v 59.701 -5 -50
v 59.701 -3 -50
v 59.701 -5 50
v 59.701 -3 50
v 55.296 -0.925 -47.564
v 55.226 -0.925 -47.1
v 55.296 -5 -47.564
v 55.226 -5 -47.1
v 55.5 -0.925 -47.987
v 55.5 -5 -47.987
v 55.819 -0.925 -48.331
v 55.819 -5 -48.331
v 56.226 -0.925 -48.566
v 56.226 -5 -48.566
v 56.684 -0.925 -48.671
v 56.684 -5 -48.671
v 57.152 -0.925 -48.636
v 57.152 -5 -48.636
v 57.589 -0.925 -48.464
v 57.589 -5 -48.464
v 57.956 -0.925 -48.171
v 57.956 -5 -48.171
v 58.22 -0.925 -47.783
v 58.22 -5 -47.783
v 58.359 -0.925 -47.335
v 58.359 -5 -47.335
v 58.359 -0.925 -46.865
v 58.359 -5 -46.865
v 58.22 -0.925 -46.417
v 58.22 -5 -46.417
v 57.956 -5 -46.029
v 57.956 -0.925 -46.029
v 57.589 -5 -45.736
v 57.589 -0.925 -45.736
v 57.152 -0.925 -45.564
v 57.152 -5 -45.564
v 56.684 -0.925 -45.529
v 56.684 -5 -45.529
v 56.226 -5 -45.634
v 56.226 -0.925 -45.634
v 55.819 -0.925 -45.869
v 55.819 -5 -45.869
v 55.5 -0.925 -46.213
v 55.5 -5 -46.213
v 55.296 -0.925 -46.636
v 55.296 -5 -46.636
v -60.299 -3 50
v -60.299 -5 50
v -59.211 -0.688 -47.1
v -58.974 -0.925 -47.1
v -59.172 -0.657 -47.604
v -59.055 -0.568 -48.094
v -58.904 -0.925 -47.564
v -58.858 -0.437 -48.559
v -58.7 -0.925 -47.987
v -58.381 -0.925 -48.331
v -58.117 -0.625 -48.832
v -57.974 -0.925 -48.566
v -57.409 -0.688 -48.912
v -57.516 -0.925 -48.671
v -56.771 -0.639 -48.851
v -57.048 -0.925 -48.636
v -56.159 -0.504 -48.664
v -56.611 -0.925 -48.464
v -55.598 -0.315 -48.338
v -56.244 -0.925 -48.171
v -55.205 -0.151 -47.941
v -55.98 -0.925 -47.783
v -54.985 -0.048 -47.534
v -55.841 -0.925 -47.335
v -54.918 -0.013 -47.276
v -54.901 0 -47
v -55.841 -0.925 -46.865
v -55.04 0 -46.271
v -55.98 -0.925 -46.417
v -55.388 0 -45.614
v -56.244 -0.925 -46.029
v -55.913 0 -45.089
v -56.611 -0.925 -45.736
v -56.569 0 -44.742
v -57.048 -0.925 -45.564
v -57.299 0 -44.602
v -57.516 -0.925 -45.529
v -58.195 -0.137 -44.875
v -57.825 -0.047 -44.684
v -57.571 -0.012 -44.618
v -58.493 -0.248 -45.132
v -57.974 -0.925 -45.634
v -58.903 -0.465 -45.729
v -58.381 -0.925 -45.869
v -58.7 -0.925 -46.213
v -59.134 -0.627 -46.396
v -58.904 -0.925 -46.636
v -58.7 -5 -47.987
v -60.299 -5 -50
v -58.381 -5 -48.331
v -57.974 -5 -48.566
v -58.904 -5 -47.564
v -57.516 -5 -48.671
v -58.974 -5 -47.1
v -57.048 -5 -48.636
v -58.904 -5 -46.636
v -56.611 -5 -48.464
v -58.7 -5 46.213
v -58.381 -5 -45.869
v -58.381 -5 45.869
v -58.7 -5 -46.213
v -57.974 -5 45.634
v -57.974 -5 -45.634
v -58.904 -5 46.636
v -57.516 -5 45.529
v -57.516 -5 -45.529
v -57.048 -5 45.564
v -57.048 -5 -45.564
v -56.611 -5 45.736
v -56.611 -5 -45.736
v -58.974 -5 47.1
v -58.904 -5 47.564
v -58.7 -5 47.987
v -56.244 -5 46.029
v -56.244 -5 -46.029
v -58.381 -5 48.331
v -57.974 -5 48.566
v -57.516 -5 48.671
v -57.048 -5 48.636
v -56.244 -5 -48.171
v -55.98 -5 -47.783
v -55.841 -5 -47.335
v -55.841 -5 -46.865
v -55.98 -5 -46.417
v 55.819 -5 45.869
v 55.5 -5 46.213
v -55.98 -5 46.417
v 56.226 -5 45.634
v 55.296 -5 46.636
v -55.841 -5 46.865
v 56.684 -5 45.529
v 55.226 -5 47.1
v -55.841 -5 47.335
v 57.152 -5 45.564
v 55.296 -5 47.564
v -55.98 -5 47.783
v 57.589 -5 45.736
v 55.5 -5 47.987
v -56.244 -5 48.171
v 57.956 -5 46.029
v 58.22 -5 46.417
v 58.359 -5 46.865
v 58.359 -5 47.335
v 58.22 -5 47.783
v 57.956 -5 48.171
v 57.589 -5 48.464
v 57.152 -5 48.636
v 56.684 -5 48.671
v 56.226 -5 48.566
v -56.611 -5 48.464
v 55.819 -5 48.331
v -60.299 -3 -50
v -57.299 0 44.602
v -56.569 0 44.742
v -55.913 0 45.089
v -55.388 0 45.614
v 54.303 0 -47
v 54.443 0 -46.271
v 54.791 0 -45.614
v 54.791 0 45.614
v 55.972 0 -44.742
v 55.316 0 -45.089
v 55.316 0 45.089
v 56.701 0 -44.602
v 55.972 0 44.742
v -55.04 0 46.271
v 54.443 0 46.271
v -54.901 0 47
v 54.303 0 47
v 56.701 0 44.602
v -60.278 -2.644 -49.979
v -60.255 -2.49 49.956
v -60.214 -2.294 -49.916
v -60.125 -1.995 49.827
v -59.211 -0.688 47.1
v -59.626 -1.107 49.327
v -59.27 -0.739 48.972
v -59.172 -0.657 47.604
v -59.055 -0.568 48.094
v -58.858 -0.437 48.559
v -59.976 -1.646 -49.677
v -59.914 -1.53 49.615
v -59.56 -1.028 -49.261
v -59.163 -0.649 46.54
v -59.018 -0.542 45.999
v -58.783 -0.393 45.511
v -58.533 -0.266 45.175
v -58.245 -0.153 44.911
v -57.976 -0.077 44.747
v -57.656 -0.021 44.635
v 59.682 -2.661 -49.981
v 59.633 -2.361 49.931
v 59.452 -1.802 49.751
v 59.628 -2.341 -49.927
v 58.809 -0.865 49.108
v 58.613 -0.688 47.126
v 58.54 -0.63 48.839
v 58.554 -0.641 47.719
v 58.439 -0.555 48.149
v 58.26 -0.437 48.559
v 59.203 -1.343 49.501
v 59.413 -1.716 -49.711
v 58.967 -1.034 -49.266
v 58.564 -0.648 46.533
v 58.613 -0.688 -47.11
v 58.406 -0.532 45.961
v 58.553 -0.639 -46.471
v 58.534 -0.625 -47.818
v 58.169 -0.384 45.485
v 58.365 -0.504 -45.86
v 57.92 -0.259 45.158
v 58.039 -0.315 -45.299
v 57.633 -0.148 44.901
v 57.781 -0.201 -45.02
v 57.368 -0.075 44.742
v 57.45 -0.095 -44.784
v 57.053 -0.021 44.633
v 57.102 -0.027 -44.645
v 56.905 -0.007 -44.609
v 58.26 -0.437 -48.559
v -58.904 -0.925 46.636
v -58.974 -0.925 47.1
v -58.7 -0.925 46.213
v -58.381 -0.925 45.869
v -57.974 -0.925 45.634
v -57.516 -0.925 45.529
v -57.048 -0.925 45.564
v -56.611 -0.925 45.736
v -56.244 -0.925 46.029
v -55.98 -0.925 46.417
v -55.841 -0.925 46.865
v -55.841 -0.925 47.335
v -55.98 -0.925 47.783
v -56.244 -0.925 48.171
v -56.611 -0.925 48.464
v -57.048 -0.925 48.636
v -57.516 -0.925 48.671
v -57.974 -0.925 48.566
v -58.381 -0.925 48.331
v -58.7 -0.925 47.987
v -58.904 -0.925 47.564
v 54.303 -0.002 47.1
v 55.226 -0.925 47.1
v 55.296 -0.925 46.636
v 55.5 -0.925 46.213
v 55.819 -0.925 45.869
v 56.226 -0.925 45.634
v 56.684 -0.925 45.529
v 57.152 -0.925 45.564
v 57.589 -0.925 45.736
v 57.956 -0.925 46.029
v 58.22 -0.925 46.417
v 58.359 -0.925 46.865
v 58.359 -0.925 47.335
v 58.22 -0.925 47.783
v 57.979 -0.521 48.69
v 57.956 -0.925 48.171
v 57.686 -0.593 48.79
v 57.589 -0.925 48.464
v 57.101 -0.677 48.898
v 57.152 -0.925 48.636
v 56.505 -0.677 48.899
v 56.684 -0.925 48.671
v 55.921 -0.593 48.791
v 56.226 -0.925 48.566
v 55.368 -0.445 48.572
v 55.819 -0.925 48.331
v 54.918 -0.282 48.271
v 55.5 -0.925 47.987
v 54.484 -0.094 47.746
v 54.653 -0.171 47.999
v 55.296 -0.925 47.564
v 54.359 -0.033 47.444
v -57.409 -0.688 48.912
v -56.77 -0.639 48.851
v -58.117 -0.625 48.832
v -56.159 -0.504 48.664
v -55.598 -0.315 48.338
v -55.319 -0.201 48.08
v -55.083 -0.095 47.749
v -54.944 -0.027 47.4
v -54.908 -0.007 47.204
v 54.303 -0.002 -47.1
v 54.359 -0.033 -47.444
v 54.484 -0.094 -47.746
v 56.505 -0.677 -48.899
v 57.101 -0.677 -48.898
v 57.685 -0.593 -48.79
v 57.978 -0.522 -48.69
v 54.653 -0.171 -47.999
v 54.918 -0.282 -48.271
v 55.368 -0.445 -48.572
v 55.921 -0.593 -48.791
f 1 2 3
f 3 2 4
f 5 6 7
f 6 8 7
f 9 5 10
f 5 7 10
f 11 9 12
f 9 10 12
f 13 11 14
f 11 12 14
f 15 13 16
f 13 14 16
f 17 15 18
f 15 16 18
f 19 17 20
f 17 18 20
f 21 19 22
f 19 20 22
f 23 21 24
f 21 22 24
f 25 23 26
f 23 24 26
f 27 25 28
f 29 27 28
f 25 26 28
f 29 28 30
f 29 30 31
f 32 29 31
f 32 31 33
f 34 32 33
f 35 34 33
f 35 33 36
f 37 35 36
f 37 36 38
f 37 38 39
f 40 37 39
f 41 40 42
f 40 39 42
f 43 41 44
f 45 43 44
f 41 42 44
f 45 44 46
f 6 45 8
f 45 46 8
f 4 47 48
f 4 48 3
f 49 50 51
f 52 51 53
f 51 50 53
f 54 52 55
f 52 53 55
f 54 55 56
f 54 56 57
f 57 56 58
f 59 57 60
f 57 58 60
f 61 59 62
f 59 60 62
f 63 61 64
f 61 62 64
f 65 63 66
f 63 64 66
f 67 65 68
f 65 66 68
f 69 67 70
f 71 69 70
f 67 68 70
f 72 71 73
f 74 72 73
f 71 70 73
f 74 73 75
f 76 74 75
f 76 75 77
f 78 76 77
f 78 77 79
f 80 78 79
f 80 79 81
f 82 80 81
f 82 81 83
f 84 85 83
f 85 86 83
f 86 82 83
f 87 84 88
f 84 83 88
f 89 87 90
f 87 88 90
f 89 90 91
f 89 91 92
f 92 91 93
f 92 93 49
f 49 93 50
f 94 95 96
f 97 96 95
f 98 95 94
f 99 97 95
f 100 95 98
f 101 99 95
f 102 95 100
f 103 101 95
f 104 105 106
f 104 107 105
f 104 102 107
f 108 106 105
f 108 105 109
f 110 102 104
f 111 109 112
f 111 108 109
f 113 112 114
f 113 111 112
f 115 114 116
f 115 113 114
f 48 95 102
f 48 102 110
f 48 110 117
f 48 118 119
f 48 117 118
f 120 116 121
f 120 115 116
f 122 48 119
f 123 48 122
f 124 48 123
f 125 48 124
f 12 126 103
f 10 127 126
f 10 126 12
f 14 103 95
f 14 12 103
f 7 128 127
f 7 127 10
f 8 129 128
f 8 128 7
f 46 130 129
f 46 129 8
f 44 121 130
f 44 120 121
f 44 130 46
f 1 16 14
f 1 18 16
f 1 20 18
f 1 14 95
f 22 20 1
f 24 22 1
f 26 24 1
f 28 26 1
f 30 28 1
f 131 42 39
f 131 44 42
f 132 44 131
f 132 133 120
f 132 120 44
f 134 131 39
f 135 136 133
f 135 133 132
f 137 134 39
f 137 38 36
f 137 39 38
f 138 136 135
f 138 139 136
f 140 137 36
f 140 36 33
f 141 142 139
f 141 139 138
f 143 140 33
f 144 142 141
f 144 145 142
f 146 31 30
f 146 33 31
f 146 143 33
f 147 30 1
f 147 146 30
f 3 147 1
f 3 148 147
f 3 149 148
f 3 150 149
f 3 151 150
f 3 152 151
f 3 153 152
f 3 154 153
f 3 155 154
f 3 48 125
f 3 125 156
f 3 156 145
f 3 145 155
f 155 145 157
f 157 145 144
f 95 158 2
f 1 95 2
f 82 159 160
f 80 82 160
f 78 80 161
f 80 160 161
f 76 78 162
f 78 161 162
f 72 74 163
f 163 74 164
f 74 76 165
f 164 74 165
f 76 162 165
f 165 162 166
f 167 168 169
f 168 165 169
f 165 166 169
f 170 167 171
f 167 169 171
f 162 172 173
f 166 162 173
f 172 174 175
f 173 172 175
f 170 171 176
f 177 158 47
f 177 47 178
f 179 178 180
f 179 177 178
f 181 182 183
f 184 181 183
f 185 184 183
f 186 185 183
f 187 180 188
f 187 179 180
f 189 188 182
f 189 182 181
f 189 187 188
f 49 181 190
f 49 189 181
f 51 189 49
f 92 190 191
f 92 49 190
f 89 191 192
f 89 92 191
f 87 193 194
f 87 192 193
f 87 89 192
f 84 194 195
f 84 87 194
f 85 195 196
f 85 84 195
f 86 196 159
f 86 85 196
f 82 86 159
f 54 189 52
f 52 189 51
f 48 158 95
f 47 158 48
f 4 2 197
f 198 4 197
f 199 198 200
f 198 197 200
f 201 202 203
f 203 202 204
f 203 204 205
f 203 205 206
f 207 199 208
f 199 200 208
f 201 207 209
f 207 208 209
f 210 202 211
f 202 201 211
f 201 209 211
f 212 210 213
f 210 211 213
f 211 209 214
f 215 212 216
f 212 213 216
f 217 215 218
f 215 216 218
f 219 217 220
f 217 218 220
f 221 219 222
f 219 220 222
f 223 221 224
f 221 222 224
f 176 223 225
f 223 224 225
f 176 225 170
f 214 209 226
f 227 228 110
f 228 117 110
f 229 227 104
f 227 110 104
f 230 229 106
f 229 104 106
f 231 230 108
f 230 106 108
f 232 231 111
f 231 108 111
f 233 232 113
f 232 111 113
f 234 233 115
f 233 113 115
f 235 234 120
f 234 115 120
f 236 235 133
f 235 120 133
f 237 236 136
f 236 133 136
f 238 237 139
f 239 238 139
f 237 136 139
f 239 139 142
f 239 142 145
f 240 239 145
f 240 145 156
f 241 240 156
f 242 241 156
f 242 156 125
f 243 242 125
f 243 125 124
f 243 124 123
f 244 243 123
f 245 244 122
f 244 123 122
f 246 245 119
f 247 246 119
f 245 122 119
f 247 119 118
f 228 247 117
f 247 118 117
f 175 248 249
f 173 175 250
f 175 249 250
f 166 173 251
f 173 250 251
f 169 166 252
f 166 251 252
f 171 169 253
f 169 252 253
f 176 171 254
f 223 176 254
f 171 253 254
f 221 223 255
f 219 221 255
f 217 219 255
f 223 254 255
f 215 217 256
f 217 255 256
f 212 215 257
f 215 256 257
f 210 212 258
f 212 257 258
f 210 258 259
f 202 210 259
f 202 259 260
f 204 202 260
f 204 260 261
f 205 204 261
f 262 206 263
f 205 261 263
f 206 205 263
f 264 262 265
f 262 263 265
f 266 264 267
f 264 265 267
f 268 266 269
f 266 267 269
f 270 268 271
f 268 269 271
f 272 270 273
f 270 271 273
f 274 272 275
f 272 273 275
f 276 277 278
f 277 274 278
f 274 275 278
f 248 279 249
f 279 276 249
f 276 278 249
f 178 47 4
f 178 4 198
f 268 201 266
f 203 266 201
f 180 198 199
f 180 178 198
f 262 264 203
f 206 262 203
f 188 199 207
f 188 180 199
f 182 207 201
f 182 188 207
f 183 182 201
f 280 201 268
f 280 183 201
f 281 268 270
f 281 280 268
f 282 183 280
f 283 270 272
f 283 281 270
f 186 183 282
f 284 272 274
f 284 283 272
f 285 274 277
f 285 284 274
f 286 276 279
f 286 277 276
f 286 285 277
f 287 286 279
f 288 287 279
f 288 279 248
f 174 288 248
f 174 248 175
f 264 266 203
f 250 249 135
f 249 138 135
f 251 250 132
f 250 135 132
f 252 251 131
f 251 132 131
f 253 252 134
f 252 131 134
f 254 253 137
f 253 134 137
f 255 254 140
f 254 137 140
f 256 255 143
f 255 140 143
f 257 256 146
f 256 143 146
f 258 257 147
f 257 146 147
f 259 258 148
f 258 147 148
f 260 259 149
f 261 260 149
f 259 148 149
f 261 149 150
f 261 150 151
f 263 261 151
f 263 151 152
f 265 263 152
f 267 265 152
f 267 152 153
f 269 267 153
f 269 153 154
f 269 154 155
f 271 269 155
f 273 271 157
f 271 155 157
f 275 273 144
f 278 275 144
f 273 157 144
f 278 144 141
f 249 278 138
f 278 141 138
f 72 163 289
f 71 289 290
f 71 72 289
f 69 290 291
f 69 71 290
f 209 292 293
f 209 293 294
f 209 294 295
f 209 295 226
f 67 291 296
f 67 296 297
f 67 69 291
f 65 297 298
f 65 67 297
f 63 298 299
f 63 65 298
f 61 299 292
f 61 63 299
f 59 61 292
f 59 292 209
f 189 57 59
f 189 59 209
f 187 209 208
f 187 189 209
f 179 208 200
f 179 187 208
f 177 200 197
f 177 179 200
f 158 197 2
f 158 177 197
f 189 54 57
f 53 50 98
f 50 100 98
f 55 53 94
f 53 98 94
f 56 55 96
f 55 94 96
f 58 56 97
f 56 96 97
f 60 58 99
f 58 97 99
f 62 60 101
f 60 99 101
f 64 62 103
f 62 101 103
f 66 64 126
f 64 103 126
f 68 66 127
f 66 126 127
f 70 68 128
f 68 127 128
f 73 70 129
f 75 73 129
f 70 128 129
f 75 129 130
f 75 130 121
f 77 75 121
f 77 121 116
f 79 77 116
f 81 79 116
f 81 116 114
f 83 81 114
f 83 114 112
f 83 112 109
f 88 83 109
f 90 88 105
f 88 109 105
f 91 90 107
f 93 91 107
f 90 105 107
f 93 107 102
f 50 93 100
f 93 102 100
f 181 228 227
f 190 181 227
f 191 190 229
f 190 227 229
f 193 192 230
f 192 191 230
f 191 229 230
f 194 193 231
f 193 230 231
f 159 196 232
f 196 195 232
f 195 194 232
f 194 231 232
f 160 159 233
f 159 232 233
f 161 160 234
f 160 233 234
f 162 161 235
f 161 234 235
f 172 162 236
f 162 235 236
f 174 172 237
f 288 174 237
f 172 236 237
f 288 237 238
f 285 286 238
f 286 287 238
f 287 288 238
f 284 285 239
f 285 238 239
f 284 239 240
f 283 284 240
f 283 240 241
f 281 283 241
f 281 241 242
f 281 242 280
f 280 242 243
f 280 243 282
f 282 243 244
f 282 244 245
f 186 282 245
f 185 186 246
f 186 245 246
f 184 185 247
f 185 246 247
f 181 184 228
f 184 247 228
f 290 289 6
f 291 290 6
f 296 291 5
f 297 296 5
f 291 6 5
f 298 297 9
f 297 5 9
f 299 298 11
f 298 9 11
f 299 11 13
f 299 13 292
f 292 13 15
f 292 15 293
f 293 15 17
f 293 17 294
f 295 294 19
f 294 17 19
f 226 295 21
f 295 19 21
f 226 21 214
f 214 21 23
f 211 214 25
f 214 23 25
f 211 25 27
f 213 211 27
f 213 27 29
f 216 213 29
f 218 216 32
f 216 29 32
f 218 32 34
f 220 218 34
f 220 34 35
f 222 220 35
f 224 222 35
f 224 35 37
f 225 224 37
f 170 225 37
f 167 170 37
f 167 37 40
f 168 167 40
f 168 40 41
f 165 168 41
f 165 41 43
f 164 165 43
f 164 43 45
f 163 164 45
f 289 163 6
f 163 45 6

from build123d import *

# Parameters (mm, degrees)
F0_W           = 120
F0_H           = 100
F1_DEPTH       = 5
F2_D           = 3.15
F2_CSINK_D     = 5
F2_CSINK_ANGLE = 90
F3_T1_DEPTH    = 135
F3_T3_DEPTH    = 115


# Not quite as in the source:
# - a fillet or chamfer that OpenCascade refuses, or shapes differently, is made with other operations: its cross-section is extruded or revolved along the edge and cut away or added


with BuildPart() as f1:
    # F0 (on Front) → F1 (new body)
    with BuildSketch(Plane.XZ):
        with Locations((-0.298661174, 0)):
            Rectangle(F0_W, F0_H)
    extrude(amount=F1_DEPTH)

    # F2 (through all)
    with Locations(Plane(origin=(0, 0, 0), x_dir=(1, 0, 0), z_dir=(0, 1, 0))):
        with Locations((-57.398661174, -47.1), (56.801338826, -47.1), (56.801338826, 47.1), (-57.398661174, 47.1)):
            CounterSinkHole(F2_D / 2, F2_CSINK_D / 2, counter_sink_angle=F2_CSINK_ANGLE)

    # F3: fillet of radius 3 on 4 edges, made by hand

    # F3_s2 → F3_t1 (cut)
    with BuildSketch(Plane.YZ.offset(-67.798661174)):
        with BuildLine():
            ThreePointArc((0, -47), (-0.8786796564, -49.1213203436), (-3, -50))
            Line((-3, -50), (0, -50))
            Line((0, -50), (0, -47))
        make_face()
        with BuildLine():
            ThreePointArc((-3, 50), (-0.8786796564, 49.1213203436), (0, 47))
            Line((0, 47), (0, 50))
            Line((0, 50), (-3, 50))
        make_face()
    extrude(amount=F3_T1_DEPTH, mode=Mode.SUBTRACT)

    # F3_s4 → F3_t3 (cut)
    with BuildSketch(Plane.XY.offset(-57.5)):
        with BuildLine():
            ThreePointArc((59.701338826, -3), (58.8226591695, -0.8786796564), (56.701338826, 0))
            Line((56.701338826, 0), (59.701338826, 0))
            Line((59.701338826, 0), (59.701338826, -3))
        make_face()
        with BuildLine():
            ThreePointArc((-60.298661174, -3), (-59.4199815176, -0.8786796564), (-57.298661174, 0))
            Line((-57.298661174, 0), (-60.298661174, 0))
            Line((-60.298661174, 0), (-60.298661174, -3))
        make_face()
    extrude(amount=F3_T3_DEPTH, mode=Mode.SUBTRACT)


solid = f1.part
